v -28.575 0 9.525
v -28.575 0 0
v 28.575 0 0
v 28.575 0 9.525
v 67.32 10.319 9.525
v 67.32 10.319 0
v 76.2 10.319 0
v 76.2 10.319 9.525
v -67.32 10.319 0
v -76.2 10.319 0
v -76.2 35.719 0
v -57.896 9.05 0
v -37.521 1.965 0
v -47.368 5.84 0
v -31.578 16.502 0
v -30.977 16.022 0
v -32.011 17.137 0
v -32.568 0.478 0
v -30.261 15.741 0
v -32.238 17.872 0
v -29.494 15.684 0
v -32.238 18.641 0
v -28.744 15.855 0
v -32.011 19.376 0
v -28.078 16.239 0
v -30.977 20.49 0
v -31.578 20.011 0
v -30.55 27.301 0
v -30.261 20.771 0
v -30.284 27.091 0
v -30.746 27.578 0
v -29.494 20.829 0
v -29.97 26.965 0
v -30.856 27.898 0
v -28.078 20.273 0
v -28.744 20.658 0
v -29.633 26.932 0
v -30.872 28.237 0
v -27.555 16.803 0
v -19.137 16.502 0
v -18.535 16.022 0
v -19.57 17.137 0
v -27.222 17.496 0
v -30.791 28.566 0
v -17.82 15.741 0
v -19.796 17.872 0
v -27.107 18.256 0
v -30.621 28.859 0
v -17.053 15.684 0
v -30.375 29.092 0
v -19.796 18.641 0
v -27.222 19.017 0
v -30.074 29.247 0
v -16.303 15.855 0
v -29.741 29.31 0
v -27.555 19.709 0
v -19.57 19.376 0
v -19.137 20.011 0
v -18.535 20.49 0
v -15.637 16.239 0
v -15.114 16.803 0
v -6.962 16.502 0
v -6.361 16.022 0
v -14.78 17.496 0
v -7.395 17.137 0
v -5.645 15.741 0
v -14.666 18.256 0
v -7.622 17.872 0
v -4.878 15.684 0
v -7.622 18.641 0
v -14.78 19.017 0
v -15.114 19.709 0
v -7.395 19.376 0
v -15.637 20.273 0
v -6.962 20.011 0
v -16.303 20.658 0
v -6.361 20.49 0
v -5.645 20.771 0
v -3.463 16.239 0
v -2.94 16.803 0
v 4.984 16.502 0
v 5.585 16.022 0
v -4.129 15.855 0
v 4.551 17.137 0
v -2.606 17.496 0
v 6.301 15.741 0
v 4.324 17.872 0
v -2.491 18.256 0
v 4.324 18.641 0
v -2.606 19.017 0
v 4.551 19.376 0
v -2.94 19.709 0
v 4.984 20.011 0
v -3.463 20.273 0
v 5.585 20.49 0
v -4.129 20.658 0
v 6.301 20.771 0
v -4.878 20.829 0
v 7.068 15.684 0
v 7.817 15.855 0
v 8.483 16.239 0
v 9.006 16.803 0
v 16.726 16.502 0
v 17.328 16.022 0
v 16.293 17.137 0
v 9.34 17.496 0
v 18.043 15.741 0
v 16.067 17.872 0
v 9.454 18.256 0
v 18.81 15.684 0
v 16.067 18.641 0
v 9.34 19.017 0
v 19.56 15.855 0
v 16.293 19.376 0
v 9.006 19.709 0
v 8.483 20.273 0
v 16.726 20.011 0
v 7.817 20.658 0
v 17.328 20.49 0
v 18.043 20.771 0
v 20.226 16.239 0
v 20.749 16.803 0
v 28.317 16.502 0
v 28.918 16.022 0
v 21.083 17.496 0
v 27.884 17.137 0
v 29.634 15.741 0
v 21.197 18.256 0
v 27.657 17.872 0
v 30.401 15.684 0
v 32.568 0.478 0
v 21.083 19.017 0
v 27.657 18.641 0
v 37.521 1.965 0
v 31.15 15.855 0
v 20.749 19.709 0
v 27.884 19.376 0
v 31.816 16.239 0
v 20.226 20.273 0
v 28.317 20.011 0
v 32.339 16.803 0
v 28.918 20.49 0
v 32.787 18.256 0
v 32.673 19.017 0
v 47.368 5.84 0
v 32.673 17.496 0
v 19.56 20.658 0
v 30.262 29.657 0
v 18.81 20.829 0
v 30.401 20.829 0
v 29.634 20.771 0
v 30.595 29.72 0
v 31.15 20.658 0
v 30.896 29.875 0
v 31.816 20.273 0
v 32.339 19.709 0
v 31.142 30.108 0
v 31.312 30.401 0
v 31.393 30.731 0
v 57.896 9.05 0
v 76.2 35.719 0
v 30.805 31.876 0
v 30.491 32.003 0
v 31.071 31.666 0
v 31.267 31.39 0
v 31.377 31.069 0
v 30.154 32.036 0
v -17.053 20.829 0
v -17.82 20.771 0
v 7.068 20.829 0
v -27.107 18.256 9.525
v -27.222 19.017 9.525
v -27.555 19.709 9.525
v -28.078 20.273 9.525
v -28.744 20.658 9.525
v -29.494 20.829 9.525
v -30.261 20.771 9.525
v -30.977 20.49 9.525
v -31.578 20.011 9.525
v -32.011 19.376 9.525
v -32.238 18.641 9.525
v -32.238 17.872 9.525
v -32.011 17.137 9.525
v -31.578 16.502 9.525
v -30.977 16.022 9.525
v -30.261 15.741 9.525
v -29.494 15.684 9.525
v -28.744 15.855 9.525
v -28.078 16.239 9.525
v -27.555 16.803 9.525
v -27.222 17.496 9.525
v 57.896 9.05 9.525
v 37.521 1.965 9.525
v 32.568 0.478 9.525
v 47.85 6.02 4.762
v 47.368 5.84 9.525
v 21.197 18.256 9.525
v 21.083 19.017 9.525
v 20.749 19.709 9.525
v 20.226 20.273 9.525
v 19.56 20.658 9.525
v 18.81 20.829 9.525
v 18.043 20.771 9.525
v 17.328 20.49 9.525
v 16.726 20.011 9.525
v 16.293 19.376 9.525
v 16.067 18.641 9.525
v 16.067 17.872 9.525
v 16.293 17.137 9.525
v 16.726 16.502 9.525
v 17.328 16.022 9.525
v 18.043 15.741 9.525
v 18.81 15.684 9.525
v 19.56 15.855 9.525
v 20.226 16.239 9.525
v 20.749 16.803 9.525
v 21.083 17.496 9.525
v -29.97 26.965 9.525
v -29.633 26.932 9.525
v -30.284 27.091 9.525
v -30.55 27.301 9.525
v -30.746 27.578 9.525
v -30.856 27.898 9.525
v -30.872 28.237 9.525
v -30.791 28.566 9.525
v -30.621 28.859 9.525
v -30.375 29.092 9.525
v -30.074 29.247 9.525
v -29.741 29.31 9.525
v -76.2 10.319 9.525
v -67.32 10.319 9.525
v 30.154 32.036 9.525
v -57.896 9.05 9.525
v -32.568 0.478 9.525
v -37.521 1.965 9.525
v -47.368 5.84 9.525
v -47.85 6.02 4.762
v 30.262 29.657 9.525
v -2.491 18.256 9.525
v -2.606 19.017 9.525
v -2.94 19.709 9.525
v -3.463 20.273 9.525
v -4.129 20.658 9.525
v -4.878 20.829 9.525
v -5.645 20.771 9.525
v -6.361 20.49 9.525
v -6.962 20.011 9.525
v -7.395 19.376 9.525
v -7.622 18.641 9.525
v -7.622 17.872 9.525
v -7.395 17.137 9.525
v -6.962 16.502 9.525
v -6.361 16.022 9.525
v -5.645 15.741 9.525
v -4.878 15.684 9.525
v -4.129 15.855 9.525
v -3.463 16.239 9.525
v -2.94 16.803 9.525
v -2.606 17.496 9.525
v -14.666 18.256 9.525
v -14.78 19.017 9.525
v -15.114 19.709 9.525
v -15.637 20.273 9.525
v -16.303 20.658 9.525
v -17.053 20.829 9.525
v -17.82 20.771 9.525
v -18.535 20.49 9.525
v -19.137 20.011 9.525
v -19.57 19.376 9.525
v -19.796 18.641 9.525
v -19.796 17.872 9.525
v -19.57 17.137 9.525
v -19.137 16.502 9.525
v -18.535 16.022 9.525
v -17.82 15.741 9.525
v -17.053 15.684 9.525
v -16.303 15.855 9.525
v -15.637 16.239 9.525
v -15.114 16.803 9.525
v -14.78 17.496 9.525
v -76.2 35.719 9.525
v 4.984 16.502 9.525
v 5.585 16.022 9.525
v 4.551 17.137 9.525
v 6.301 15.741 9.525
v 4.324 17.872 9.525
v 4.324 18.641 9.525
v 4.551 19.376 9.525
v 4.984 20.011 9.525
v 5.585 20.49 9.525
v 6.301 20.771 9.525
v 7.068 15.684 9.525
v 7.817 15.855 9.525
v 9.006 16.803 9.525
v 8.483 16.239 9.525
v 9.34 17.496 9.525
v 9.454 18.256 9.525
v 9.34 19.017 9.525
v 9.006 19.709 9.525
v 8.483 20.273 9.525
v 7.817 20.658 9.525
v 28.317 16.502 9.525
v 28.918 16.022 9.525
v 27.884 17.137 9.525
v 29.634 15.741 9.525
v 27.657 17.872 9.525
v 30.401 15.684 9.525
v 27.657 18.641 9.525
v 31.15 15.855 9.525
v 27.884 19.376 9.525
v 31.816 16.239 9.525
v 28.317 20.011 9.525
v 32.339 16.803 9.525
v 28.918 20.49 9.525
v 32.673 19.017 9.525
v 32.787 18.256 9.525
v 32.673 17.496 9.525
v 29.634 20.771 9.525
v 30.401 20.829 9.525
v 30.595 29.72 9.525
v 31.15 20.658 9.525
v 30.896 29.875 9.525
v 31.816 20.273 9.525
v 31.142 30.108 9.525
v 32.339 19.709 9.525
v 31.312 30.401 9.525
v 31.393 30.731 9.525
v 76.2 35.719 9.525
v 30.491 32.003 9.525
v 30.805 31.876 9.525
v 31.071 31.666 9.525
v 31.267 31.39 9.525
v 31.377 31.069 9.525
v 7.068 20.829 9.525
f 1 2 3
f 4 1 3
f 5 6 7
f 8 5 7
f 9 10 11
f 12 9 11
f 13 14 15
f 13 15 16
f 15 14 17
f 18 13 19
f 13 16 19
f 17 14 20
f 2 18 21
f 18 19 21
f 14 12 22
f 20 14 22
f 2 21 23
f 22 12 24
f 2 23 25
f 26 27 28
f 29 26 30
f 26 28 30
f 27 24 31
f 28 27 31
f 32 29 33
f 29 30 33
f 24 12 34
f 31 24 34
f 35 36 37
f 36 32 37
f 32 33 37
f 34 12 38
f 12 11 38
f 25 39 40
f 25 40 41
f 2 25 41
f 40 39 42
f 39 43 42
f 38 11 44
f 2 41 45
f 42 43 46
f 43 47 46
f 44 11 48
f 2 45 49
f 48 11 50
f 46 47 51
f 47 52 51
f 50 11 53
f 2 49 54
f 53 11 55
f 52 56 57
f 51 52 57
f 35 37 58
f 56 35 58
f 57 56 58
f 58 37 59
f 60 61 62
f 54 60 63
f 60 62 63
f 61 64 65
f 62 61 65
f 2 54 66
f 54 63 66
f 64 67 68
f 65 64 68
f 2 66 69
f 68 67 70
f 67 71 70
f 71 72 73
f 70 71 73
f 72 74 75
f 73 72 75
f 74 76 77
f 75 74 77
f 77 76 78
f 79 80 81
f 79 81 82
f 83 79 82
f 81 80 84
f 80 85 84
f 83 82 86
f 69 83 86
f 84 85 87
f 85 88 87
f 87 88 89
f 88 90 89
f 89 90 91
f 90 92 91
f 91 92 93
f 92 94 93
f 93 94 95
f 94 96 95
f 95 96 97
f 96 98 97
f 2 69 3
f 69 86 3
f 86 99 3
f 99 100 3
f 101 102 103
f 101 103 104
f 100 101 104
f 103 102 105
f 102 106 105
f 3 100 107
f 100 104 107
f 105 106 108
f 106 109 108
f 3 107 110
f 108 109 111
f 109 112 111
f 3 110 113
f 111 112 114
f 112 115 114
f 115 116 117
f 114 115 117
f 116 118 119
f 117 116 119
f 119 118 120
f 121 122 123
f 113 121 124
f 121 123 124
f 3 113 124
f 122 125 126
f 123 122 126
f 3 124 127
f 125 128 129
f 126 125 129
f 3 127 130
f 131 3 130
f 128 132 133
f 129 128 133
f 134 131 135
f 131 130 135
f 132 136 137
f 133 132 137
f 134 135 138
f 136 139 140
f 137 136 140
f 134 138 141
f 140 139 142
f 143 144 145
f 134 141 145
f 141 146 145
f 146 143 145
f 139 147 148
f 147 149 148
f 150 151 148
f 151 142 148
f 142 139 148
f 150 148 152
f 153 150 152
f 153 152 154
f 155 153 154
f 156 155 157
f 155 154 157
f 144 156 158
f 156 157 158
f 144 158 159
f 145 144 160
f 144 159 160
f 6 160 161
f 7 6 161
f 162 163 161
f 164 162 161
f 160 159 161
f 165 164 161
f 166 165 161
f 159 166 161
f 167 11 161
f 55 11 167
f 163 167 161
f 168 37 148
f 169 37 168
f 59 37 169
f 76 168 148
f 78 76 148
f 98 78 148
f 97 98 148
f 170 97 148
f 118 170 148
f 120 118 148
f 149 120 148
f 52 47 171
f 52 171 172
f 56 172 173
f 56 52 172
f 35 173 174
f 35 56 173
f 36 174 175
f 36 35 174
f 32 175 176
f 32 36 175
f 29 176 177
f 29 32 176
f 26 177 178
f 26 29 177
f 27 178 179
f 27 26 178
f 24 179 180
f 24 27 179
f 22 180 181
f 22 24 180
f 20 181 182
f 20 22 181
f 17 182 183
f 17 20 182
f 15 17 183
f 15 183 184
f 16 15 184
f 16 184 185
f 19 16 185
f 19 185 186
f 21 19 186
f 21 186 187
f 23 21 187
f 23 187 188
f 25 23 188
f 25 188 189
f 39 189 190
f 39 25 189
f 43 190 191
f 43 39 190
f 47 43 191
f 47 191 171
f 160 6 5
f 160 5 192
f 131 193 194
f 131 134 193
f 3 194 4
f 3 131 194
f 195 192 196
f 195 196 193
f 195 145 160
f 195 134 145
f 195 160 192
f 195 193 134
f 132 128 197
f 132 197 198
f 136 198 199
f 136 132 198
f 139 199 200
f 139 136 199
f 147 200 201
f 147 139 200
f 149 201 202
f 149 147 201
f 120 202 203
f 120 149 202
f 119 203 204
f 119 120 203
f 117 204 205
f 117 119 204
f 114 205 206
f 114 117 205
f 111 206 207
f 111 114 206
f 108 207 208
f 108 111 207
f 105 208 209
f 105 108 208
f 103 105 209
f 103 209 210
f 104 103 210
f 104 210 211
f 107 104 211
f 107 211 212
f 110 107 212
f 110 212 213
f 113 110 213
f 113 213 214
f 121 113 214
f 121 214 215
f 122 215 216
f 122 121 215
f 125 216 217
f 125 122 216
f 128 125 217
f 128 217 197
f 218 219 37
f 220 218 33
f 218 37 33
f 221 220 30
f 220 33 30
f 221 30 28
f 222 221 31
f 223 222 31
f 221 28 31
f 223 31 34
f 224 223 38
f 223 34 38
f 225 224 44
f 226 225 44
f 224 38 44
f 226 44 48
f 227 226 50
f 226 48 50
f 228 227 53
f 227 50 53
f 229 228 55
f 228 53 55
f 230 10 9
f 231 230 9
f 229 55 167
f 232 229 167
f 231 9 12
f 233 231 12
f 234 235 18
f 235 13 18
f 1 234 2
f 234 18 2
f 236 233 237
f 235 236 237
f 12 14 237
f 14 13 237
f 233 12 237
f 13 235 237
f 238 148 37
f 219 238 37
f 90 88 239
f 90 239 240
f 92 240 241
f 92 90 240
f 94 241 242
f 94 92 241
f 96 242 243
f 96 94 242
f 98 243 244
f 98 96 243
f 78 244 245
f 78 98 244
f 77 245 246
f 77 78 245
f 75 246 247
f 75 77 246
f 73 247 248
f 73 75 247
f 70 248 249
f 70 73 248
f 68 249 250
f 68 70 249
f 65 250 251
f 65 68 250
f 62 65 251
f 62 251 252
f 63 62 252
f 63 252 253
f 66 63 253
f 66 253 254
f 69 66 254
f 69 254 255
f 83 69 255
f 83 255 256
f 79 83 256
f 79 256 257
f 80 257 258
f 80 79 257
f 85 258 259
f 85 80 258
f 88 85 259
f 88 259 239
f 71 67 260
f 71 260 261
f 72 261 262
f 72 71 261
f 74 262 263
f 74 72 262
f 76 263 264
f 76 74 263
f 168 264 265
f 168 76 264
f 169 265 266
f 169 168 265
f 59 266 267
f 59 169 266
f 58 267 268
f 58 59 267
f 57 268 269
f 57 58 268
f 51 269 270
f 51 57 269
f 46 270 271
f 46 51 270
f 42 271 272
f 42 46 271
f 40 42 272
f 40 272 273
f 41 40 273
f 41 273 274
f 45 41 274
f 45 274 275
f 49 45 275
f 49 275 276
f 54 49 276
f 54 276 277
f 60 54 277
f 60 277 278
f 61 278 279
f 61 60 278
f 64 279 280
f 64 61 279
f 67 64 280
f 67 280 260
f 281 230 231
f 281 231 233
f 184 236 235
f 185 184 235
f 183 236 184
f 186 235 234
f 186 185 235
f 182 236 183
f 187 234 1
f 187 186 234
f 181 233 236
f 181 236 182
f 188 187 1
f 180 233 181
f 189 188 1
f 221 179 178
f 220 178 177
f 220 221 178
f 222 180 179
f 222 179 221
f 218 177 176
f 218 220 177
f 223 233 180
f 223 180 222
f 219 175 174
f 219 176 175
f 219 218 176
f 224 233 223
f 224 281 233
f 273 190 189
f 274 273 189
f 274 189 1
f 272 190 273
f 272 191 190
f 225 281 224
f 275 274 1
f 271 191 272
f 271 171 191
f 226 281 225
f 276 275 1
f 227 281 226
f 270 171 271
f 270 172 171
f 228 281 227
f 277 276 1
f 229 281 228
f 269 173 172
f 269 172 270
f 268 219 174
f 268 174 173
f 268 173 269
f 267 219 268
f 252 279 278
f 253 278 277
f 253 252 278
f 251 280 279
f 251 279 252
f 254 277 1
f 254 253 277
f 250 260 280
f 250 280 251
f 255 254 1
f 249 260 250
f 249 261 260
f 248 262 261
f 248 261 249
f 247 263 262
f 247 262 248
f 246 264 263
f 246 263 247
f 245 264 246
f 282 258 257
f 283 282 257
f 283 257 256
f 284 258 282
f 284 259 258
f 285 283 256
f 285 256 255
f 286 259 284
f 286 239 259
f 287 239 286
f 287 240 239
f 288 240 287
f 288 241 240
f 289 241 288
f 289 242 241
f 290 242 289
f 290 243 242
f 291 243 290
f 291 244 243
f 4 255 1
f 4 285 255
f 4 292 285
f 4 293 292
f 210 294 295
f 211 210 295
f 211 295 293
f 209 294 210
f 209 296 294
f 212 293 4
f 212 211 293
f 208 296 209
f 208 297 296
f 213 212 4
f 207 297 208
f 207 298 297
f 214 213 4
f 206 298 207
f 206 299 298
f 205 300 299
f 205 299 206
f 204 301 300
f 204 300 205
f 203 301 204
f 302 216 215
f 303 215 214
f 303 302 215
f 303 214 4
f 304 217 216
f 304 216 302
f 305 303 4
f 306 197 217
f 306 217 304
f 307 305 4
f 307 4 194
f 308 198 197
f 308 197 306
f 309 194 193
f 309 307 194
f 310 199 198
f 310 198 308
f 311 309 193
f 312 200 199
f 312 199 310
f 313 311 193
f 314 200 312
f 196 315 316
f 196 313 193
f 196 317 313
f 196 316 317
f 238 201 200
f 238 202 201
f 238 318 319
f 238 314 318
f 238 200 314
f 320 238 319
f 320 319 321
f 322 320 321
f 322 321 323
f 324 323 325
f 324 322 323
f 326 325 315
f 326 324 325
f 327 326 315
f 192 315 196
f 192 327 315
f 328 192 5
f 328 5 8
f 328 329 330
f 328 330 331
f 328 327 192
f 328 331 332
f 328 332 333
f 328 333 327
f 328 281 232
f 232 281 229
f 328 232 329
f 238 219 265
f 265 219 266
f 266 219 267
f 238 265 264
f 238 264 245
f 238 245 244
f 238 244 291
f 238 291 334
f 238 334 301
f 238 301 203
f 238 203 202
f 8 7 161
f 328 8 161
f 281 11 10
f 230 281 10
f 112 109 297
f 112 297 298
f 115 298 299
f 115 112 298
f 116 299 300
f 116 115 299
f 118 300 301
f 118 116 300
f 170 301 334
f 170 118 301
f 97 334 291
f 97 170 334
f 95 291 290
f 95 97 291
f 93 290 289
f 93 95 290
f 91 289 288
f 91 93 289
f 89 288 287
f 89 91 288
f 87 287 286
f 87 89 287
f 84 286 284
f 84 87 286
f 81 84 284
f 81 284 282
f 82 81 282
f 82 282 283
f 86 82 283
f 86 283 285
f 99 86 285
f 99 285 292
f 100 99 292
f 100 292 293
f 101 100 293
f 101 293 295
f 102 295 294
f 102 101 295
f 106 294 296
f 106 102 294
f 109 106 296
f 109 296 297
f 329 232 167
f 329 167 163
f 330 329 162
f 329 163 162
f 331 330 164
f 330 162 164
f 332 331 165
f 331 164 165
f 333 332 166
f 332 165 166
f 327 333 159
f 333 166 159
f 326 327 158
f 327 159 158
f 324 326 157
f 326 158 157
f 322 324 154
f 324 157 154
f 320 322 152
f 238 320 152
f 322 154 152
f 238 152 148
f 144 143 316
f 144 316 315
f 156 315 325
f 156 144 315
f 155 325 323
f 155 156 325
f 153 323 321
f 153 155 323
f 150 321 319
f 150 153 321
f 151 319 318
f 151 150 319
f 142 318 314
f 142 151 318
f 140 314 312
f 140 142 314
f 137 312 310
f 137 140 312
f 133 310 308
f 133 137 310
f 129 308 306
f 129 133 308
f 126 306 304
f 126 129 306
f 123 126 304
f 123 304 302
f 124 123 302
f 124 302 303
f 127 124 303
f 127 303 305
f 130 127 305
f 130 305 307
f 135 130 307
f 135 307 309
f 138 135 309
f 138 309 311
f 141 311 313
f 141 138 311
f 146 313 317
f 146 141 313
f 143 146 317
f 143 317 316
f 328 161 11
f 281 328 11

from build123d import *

# Parameters (mm, degrees)
F0_R     = 2.5796875
F1_DEPTH = 9.525


with BuildPart() as f1:
    # F0 (on Top) → F1 (new body)
    with BuildSketch(Plane.XY):
        with BuildLine():
            Line((76.2, 35.71875), (0, 35.71875))
            Line((0, 35.71875), (-76.2, 35.71875))
            Line((-76.2, 35.71875), (-76.2, 10.31875))
            Line((-76.2, 10.31875), (-67.3197399736, 10.31875))
            add(Edge.make_bspline(
                [(-67.3197399736, 10.31875), (-61.8867674924, 10.2547754123), (-47.5386632194, 6.8807184355), (-34.2599964973, 0), (-28.575, 0)],
                knots=[0, 0, 0, 0, 0.4984157806, 1, 1, 1, 1], degree=3))
            Line((-28.575, 0), (0, 0))
            Line((0, 0), (28.575, 0))
            add(Edge.make_bspline(
                [(67.3197399736, 10.31875), (61.8867674924, 10.2547754123), (47.5386632194, 6.8807184355), (34.2599964973, 0), (28.575, 0)],
                knots=[0, 0, 0, 0, 0.4984157806, 1, 1, 1, 1], degree=3))
            Line((67.3197399736, 10.31875), (76.2, 10.31875))
            Line((76.2, 10.31875), (76.2, 35.71875))
        make_face()
        with Locations((-29.6867411598, 18.25625)):
            Circle(F0_R, mode=Mode.SUBTRACT)
        with Locations((-17.2455671598, 18.25625)):
            Circle(F0_R, mode=Mode.SUBTRACT)
        with Locations((-5.0710931598, 18.25625)):
            Circle(F0_R, mode=Mode.SUBTRACT)
        with Locations((6.8747808402, 18.25625)):
            Circle(F0_R, mode=Mode.SUBTRACT)
        with Locations((18.6174548402, 18.25625)):
            Circle(F0_R, mode=Mode.SUBTRACT)
        with Locations((30.2077288402, 18.25625)):
            Circle(F0_R, mode=Mode.SUBTRACT)
        with BuildLine():
            ThreePointArc((-29.6326200987, 26.9315806998), (-30.87613546, 28.0668539389), (-29.7408622209, 29.3103693002))
            Line((-29.7408622209, 29.3103693002), (30.1536077791, 32.03575))
            ThreePointArc((30.1536077791, 32.03575), (31.3971231404, 30.9004767609), (30.2618499013, 29.6569613996))
            Line((30.2618499013, 29.6569613996), (-29.6326200987, 26.9315806998))
        make_face(mode=Mode.SUBTRACT)
    extrude(amount=F1_DEPTH)


solid = f1.part
